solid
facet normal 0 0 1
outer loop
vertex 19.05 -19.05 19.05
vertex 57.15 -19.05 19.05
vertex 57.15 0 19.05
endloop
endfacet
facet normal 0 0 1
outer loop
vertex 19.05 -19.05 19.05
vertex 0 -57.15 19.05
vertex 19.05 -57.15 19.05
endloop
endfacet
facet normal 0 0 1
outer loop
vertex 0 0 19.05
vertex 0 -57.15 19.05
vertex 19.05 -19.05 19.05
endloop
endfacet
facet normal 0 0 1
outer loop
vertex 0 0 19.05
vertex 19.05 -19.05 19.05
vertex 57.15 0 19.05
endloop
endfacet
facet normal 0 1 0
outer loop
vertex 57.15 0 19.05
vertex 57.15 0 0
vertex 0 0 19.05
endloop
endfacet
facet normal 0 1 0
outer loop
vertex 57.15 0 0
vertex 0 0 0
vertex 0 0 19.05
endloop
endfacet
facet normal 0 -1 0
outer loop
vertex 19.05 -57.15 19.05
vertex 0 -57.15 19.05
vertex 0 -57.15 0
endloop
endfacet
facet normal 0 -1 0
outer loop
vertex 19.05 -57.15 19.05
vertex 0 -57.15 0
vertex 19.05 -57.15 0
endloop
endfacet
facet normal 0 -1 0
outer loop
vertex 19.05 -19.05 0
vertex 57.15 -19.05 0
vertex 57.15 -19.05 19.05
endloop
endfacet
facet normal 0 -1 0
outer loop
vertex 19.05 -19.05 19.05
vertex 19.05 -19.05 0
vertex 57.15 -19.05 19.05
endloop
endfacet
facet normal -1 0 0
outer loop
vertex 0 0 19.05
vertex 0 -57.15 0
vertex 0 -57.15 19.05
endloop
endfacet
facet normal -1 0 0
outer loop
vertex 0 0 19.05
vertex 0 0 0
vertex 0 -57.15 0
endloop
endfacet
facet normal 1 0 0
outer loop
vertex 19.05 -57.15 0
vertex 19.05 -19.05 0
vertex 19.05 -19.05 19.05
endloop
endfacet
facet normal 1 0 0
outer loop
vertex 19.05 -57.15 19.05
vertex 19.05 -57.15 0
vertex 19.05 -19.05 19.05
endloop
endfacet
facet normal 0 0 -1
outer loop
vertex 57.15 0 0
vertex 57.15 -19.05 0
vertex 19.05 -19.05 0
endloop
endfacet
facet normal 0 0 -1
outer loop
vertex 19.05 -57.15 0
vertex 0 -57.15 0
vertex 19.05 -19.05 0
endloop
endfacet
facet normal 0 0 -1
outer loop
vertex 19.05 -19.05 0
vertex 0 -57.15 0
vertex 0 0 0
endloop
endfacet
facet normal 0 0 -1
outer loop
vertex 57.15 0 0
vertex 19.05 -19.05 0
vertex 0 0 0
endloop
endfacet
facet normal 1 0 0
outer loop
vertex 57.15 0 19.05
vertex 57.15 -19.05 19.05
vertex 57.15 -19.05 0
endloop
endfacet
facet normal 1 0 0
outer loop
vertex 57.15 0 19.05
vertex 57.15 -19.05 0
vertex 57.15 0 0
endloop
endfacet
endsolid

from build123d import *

# Parameters (mm, degrees)
F0_W      = 19.05
F0_H      = 19.05
F1_DEPTH  = 19.05
F1_FACE_W = 19.05
F1_FACE_H = 19.05
F2_DEPTH  = 38.1
F3_W      = 19.05
F3_H      = 19.05
F4_DEPTH  = 38.1


with BuildPart() as f1:
    # F0 (on Top) → F1 (new body)
    with BuildSketch(Plane.XY):
        with Locations((9.525, -9.525)):
            Rectangle(F0_W, F0_H)
    extrude(amount=F1_DEPTH)

    # F1_face (on face) → F2 (join)
    with BuildSketch(Plane(origin=(9.525, -19.05, 9.525), x_dir=(1, 0, 0), z_dir=(0, -1, 0))):
        Rectangle(F1_FACE_W, F1_FACE_H)
    extrude(amount=F2_DEPTH)

    # F3 (on face) → F4 (join)
    with BuildSketch(Plane.YZ.offset(19.05)):
        with Locations((-9.525, 9.525)):
            Rectangle(F3_W, F3_H)
    extrude(amount=F4_DEPTH)


solid = f1.part
